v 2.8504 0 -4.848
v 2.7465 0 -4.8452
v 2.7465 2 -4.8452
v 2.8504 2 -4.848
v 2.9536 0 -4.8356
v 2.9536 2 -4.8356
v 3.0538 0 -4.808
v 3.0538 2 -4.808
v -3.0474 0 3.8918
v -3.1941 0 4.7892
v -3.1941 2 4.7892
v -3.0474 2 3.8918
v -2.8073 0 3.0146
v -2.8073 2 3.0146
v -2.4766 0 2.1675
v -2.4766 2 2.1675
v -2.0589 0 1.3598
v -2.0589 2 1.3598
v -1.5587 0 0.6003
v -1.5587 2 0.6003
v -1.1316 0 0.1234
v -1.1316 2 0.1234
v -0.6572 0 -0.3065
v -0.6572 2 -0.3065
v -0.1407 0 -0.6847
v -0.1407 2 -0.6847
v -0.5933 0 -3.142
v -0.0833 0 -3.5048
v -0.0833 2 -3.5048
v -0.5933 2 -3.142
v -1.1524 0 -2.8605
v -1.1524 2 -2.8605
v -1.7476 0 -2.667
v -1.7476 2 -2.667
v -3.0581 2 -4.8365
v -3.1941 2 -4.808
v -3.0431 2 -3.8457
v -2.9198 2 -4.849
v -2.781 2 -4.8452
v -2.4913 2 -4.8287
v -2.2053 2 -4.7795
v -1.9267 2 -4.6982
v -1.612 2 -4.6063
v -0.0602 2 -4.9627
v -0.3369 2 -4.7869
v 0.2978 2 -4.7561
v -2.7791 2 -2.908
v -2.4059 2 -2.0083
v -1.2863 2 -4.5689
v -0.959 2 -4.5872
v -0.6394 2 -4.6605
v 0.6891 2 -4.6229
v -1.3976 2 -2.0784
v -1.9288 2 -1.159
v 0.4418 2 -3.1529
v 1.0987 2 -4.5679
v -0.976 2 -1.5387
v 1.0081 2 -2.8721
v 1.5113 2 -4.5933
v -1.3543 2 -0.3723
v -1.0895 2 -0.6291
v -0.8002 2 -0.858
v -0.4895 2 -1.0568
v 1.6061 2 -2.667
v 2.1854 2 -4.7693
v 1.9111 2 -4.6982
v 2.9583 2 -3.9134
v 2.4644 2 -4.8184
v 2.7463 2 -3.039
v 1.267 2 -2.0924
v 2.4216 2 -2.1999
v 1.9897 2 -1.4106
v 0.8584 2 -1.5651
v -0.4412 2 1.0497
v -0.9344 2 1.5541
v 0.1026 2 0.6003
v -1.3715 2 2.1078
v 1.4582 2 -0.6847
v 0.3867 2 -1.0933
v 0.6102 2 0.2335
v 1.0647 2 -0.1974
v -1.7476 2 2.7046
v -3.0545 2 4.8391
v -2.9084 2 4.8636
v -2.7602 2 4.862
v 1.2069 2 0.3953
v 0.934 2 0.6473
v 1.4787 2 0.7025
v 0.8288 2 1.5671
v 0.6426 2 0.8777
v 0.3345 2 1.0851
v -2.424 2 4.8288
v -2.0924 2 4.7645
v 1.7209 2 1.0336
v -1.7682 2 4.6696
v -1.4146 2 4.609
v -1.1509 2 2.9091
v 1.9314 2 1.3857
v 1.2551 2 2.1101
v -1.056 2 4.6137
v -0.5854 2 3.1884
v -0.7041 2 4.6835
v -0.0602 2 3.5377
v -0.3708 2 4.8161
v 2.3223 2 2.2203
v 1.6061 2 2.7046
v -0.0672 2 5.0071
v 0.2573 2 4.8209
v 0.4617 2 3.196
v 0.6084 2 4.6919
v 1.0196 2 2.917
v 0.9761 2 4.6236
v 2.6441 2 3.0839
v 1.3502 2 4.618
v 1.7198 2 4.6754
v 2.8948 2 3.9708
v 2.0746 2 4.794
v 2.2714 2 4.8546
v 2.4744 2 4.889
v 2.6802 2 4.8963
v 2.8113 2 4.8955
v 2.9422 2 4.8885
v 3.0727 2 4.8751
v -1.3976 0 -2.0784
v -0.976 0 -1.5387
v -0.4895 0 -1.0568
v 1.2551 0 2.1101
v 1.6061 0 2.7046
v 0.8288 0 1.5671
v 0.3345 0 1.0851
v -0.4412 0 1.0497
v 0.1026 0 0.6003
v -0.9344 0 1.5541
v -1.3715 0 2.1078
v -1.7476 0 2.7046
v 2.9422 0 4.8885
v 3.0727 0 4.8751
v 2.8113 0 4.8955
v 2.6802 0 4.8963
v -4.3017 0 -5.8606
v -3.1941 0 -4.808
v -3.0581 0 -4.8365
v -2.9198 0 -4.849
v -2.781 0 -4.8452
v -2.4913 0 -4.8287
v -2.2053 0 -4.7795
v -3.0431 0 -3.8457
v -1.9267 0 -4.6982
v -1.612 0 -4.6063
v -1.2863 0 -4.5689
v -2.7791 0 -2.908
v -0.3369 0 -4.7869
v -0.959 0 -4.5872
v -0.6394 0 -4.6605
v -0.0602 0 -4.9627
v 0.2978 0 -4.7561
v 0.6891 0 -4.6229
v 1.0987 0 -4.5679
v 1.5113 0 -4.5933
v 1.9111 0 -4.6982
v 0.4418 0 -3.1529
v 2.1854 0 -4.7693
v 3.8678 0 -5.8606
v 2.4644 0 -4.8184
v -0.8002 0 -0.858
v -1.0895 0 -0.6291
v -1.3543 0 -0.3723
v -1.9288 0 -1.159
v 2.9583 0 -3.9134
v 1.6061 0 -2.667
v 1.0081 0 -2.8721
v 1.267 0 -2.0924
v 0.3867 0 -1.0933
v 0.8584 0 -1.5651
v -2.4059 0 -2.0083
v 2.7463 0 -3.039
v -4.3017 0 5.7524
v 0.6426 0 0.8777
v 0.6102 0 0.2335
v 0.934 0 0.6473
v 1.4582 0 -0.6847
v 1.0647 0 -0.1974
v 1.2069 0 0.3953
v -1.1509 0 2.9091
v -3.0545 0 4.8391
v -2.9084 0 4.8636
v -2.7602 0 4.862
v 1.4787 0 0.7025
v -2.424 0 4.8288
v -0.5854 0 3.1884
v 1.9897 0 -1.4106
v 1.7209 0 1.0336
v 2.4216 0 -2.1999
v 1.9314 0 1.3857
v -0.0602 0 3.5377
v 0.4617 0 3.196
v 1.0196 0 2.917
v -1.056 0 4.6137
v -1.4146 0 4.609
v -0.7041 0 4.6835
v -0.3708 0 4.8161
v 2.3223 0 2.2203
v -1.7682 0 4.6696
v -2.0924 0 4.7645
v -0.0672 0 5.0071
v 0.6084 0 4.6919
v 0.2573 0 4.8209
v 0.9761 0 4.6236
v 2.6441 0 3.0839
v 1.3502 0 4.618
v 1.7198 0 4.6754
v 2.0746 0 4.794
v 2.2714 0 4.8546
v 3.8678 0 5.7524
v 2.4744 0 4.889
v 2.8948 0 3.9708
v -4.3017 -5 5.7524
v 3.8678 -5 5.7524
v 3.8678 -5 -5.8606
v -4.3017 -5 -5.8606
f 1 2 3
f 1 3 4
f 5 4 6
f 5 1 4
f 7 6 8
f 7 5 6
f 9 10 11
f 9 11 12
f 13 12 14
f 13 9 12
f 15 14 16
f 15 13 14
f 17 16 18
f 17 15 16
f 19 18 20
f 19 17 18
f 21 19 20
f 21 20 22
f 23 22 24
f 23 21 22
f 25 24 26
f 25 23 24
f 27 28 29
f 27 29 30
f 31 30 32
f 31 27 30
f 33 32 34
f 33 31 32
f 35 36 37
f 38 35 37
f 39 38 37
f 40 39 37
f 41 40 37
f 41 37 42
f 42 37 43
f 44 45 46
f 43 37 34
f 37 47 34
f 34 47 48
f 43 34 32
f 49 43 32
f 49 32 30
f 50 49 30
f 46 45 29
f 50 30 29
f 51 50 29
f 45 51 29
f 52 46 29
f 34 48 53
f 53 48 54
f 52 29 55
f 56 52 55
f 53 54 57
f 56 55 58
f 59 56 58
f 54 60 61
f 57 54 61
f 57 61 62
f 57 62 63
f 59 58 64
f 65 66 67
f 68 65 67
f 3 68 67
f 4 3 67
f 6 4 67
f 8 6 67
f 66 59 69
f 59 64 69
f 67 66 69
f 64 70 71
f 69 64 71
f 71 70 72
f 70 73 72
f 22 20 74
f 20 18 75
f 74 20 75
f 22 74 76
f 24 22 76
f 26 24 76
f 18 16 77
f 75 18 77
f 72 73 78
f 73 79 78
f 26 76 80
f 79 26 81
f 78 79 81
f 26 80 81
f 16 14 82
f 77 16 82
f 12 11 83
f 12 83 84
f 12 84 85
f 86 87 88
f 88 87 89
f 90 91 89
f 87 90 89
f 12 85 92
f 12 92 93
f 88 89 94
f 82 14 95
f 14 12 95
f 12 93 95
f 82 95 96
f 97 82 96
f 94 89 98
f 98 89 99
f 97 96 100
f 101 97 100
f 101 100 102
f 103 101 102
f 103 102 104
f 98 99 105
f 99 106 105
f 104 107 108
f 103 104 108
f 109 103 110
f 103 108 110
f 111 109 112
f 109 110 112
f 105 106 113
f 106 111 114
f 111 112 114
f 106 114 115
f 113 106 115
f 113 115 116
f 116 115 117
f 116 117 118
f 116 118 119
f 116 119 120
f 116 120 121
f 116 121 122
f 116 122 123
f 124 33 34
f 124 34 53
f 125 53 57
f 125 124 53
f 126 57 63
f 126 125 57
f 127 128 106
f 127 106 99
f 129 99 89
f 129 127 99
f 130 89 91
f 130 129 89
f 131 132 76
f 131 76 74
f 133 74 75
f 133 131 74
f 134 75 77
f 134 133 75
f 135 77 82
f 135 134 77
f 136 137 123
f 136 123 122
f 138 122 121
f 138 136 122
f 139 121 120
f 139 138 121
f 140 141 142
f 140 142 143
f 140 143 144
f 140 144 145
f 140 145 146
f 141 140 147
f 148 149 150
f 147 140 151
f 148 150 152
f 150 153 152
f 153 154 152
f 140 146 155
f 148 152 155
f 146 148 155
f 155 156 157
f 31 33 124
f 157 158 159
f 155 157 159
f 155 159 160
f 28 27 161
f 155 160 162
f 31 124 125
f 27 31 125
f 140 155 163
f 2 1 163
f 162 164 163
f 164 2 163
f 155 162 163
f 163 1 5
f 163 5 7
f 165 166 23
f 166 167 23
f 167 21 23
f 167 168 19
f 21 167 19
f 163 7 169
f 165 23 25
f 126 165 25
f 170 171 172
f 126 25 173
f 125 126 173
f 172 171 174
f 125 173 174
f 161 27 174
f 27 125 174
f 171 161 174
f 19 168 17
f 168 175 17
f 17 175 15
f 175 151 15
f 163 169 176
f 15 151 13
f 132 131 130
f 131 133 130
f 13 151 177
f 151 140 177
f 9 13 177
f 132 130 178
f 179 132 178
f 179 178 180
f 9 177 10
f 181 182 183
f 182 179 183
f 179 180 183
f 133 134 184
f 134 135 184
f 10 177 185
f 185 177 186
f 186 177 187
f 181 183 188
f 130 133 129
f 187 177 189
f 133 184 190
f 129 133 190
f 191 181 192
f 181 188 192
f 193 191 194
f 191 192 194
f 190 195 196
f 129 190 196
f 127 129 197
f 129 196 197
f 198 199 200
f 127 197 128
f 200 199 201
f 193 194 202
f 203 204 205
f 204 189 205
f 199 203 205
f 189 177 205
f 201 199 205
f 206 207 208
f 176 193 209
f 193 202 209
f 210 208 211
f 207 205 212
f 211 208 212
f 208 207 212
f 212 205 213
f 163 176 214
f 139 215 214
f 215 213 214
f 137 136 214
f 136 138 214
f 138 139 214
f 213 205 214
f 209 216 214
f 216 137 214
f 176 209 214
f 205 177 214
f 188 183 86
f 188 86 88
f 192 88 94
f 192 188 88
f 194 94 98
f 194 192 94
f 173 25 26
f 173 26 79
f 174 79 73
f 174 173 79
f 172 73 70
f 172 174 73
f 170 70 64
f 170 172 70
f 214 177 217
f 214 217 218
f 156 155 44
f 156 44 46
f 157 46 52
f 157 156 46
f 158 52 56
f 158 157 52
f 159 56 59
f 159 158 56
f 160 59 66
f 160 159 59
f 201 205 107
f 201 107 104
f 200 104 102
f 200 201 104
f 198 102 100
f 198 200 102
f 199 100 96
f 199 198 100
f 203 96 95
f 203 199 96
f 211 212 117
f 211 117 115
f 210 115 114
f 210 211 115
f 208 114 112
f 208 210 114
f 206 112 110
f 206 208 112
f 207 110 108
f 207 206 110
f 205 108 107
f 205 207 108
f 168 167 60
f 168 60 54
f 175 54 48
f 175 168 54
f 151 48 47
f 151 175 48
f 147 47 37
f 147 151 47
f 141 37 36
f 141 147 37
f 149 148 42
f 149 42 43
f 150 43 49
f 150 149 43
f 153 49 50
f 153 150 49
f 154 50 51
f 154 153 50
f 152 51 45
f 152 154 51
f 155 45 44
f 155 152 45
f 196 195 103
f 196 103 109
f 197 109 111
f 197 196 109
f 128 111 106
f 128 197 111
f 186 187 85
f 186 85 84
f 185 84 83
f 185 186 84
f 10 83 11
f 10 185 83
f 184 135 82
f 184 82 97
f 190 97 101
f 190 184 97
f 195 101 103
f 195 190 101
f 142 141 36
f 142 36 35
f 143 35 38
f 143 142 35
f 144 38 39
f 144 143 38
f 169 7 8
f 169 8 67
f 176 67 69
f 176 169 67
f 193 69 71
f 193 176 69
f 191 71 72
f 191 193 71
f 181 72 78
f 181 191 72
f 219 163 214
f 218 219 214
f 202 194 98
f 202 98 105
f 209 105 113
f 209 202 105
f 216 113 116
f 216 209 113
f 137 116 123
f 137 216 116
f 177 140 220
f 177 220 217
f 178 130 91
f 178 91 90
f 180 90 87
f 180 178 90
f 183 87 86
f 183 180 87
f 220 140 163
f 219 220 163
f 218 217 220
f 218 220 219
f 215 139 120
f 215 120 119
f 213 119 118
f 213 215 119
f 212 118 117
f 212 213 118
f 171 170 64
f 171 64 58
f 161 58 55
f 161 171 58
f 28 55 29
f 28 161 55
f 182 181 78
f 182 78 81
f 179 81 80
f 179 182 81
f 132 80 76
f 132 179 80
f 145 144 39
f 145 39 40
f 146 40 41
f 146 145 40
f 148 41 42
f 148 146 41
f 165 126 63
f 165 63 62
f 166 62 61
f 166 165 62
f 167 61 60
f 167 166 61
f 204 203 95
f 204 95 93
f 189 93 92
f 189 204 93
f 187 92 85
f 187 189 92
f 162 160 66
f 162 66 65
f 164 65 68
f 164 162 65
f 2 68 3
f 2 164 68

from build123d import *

# Parameters (mm, degrees)
F1_DEPTH = 2
F0_W     = 8.1694817636
F0_H     = 11.6130132228
F2_DEPTH = 5


with BuildPart() as f1:
    # F0 (on Front) → F1 (new body)
    with BuildSketch(Plane.XZ):
        with BuildLine():
            ThreePointArc((2.0745592192, 4.7939633951), (0.9761382847, 4.6235844423), (-0.0671644666, 5.0070905127))
            ThreePointArc((-0.0671644666, 5.0070905127), (-0.8784360137, 4.6405956483), (-1.7681780737, 4.6695624478))
            ThreePointArc((-1.7681780737, 4.6695624478), (-2.2574396576, 4.800493813), (-2.7601739857, 4.8619601876))
            ThreePointArc((-2.7601739857, 4.8619601876), (-2.9819736355, 4.8545860582), (-3.1940550543, 4.7892336734))
            ThreePointArc((-3.1940550543, 4.7892336734), (-2.6531015818, 2.5867346288), (-1.5586973168, 0.6003026501))
            ThreePointArc((-1.5586973168, 0.6003026501), (-0.899975173, -0.0976882802), (-0.1406859956, -0.6847028853))
            ThreePointArc((-0.1406859956, -0.6847028853), (0.8584014623, -1.565082943), (1.606091857, -2.6669921353))
            ThreePointArc((1.606091857, -2.6669921353), (0.7204240657, -3.0032988166), (-0.0832898513, -3.5048499703))
            ThreePointArc((-0.0832898513, -3.5048499703), (-0.8674701353, -2.9905919725), (-1.7476310022, -2.6669921353))
            ThreePointArc((-1.7476310022, -2.6669921353), (-1.1953566595, -1.8018699169), (-0.4894761951, -1.0567684658))
            ThreePointArc((-0.4894761951, -1.0567684658), (-0.947757472, -0.7472134604), (-1.3543482637, -0.3723402042))
            ThreePointArc((-1.3543482637, -0.3723402042), (-2.6058728778, -2.4526172564), (-3.1940550543, -4.8080170527))
            ThreePointArc((-3.1940550543, -4.8080170527), (-2.9891724287, -4.8447819272), (-2.7810176834, -4.8451670446))
            ThreePointArc((-2.7810176834, -4.8451670446), (-2.3475821057, -4.8081959008), (-1.9267009338, -4.698230885))
            ThreePointArc((-1.9267009338, -4.698230885), (-0.9589614264, -4.5871526974), (-0.0601788415, -4.9627162516))
            ThreePointArc((-0.0601788415, -4.9627162516), (0.8925619892, -4.5853815797), (1.9110714784, -4.698230885))
            ThreePointArc((1.9110714784, -4.698230885), (2.3244075631, -4.7966180699), (2.7465091553, -4.8451670446))
            ThreePointArc((2.7465091553, -4.8451670446), (2.9022453839, -4.8437183941), (3.0538411811, -4.8080170527))
            ThreePointArc((3.0538411811, -4.8080170527), (2.5977340123, -2.6141166836), (1.4581748983, -0.6847028853))
            ThreePointArc((1.4581748983, -0.6847028853), (0.844614848, 0.0255748016), (0.1025648307, 0.6003026501))
            ThreePointArc((0.1025648307, 0.6003026501), (-0.9344126252, 1.5540806838), (-1.7476310022, 2.7045982424))
            ThreePointArc((-1.7476310022, 2.7045982424), (-0.863666357, 3.0396657594), (-0.0601788415, 3.5377335735))
            ThreePointArc((-0.0601788415, 3.5377335735), (0.7365671742, 3.0483872393), (1.606091857, 2.7045982424))
            ThreePointArc((1.606091857, 2.7045982424), (1.0509505262, 1.8315226419), (0.3344639845, 1.0851380648))
            ThreePointArc((0.3344639845, 1.0851380648), (0.7904820411, 0.7652480559), (1.2069143122, 0.3952936677))
            ThreePointArc((1.2069143122, 0.3952936677), (1.6036378384, 0.865266534), (1.9314256497, 1.3856694568))
            ThreePointArc((1.9314256497, 1.3856694568), (2.6441028172, 3.083940128), (3.0726515688, 4.8751346973))
            ThreePointArc((3.0726515688, 4.8751346973), (2.8768268251, 4.8927984193), (2.680238802, 4.8963320442))
            ThreePointArc((2.680238802, 4.8963320442), (2.3723307757, 4.8751346973), (2.0745592192, 4.7939633951))
        make_face()
    extrude(amount=-F1_DEPTH)

    # F0 (on Front) + F1_face (on face) → F2 (join)
    with BuildSketch(Plane.XZ):
        with Locations((-0.2169868676, -0.0541191548)):
            Rectangle(F0_W, F0_H)
        with BuildLine():
            ThreePointArc((-1.7681780737, 4.6695624478), (-0.8784360137, 4.6405956483), (-0.0671644666, 5.0070905127))
            ThreePointArc((-0.0671644666, 5.0070905127), (0.9761382847, 4.6235844423), (2.0745592192, 4.7939633951))
            ThreePointArc((2.0745592192, 4.7939633951), (2.3723307757, 4.8751346973), (2.680238802, 4.8963320442))
            ThreePointArc((2.680238802, 4.8963320442), (2.8768268251, 4.8927984193), (3.0726515688, 4.8751346973))
            ThreePointArc((3.0726515688, 4.8751346973), (2.6441028172, 3.083940128), (1.9314256497, 1.3856694568))
            ThreePointArc((1.9314256497, 1.3856694568), (1.6036378384, 0.865266534), (1.2069143122, 0.3952936677))
            ThreePointArc((1.2069143122, 0.3952936677), (0.7904820411, 0.7652480559), (0.3344639845, 1.0851380648))
            ThreePointArc((0.3344639845, 1.0851380648), (1.0509505262, 1.8315226419), (1.606091857, 2.7045982424))
            ThreePointArc((1.606091857, 2.7045982424), (0.7365671742, 3.0483872393), (-0.0601788415, 3.5377335735))
            ThreePointArc((-0.0601788415, 3.5377335735), (-0.863666357, 3.0396657594), (-1.7476310022, 2.7045982424))
            ThreePointArc((-1.7476310022, 2.7045982424), (-0.9344126252, 1.5540806838), (0.1025648307, 0.6003026501))
            ThreePointArc((0.1025648307, 0.6003026501), (0.844614848, 0.0255748016), (1.4581748983, -0.6847028853))
            ThreePointArc((1.4581748983, -0.6847028853), (2.5977340123, -2.6141166836), (3.0538411811, -4.8080170527))
            ThreePointArc((3.0538411811, -4.8080170527), (2.9022453839, -4.8437183941), (2.7465091553, -4.8451670446))
            ThreePointArc((2.7465091553, -4.8451670446), (2.3244075631, -4.7966180699), (1.9110714784, -4.698230885))
            ThreePointArc((1.9110714784, -4.698230885), (0.8925619892, -4.5853815797), (-0.0601788415, -4.9627162516))
            ThreePointArc((-0.0601788415, -4.9627162516), (-0.9589614264, -4.5871526974), (-1.9267009338, -4.698230885))
            ThreePointArc((-1.9267009338, -4.698230885), (-2.3475821057, -4.8081959008), (-2.7810176834, -4.8451670446))
            ThreePointArc((-2.7810176834, -4.8451670446), (-2.9891724287, -4.8447819272), (-3.1940550543, -4.8080170527))
            ThreePointArc((-3.1940550543, -4.8080170527), (-2.6058728778, -2.4526172564), (-1.3543482637, -0.3723402042))
            ThreePointArc((-1.3543482637, -0.3723402042), (-0.947757472, -0.7472134604), (-0.4894761951, -1.0567684658))
            ThreePointArc((-0.4894761951, -1.0567684658), (-1.1953566595, -1.8018699169), (-1.7476310022, -2.6669921353))
            ThreePointArc((-1.7476310022, -2.6669921353), (-0.8674701353, -2.9905919725), (-0.0832898513, -3.5048499703))
            ThreePointArc((-0.0832898513, -3.5048499703), (0.7204240657, -3.0032988166), (1.606091857, -2.6669921353))
            ThreePointArc((1.606091857, -2.6669921353), (0.8584014623, -1.565082943), (-0.1406859956, -0.6847028853))
            ThreePointArc((-0.1406859956, -0.6847028853), (-0.899975173, -0.0976882802), (-1.5586973168, 0.6003026501))
            ThreePointArc((-1.5586973168, 0.6003026501), (-2.6531015818, 2.5867346288), (-3.1940550543, 4.7892336734))
            ThreePointArc((-3.1940550543, 4.7892336734), (-2.9819736355, 4.8545860582), (-2.7601739857, 4.8619601876))
            ThreePointArc((-2.7601739857, 4.8619601876), (-2.2574396576, 4.800493813), (-1.7681780737, 4.6695624478))
        make_face(mode=Mode.SUBTRACT)
        with BuildLine():
            ThreePointArc((2.0745592192, 4.7939633951), (0.9761382847, 4.6235844423), (-0.0671644666, 5.0070905127))
            ThreePointArc((-0.0671644666, 5.0070905127), (-0.8784360137, 4.6405956483), (-1.7681780737, 4.6695624478))
            ThreePointArc((-1.7681780737, 4.6695624478), (-2.2574396576, 4.800493813), (-2.7601739857, 4.8619601876))
            ThreePointArc((-2.7601739857, 4.8619601876), (-2.9819736355, 4.8545860582), (-3.1940550543, 4.7892336734))
            ThreePointArc((-3.1940550543, 4.7892336734), (-2.6531015818, 2.5867346288), (-1.5586973168, 0.6003026501))
            ThreePointArc((-1.5586973168, 0.6003026501), (-0.899975173, -0.0976882802), (-0.1406859956, -0.6847028853))
            ThreePointArc((-0.1406859956, -0.6847028853), (0.8584014623, -1.565082943), (1.606091857, -2.6669921353))
            ThreePointArc((1.606091857, -2.6669921353), (0.7204240657, -3.0032988166), (-0.0832898513, -3.5048499703))
            ThreePointArc((-0.0832898513, -3.5048499703), (-0.8674701353, -2.9905919725), (-1.7476310022, -2.6669921353))
            ThreePointArc((-1.7476310022, -2.6669921353), (-1.1953566595, -1.8018699169), (-0.4894761951, -1.0567684658))
            ThreePointArc((-0.4894761951, -1.0567684658), (-0.947757472, -0.7472134604), (-1.3543482637, -0.3723402042))
            ThreePointArc((-1.3543482637, -0.3723402042), (-2.6058728778, -2.4526172564), (-3.1940550543, -4.8080170527))
            ThreePointArc((-3.1940550543, -4.8080170527), (-2.9891724287, -4.8447819272), (-2.7810176834, -4.8451670446))
            ThreePointArc((-2.7810176834, -4.8451670446), (-2.3475821057, -4.8081959008), (-1.9267009338, -4.698230885))
            ThreePointArc((-1.9267009338, -4.698230885), (-0.9589614264, -4.5871526974), (-0.0601788415, -4.9627162516))
            ThreePointArc((-0.0601788415, -4.9627162516), (0.8925619892, -4.5853815797), (1.9110714784, -4.698230885))
            ThreePointArc((1.9110714784, -4.698230885), (2.3244075631, -4.7966180699), (2.7465091553, -4.8451670446))
            ThreePointArc((2.7465091553, -4.8451670446), (2.9022453839, -4.8437183941), (3.0538411811, -4.8080170527))
            ThreePointArc((3.0538411811, -4.8080170527), (2.5977340123, -2.6141166836), (1.4581748983, -0.6847028853))
            ThreePointArc((1.4581748983, -0.6847028853), (0.844614848, 0.0255748016), (0.1025648307, 0.6003026501))
            ThreePointArc((0.1025648307, 0.6003026501), (-0.9344126252, 1.5540806838), (-1.7476310022, 2.7045982424))
            ThreePointArc((-1.7476310022, 2.7045982424), (-0.863666357, 3.0396657594), (-0.0601788415, 3.5377335735))
            ThreePointArc((-0.0601788415, 3.5377335735), (0.7365671742, 3.0483872393), (1.606091857, 2.7045982424))
            ThreePointArc((1.606091857, 2.7045982424), (1.0509505262, 1.8315226419), (0.3344639845, 1.0851380648))
            ThreePointArc((0.3344639845, 1.0851380648), (0.7904820411, 0.7652480559), (1.2069143122, 0.3952936677))
            ThreePointArc((1.2069143122, 0.3952936677), (1.6036378384, 0.865266534), (1.9314256497, 1.3856694568))
            ThreePointArc((1.9314256497, 1.3856694568), (2.6441028172, 3.083940128), (3.0726515688, 4.8751346973))
            ThreePointArc((3.0726515688, 4.8751346973), (2.8768268251, 4.8927984193), (2.680238802, 4.8963320442))
            ThreePointArc((2.680238802, 4.8963320442), (2.3723307757, 4.8751346973), (2.0745592192, 4.7939633951))
        make_face()
    with BuildSketch(Plane(origin=(-0.0652834318, 2, -5.64561e-05), x_dir=(1, 0, 0), z_dir=(0, 1, 0))):
        with BuildLine():
            ThreePointArc((2.7455222338, -4.8963885003), (2.9421102569, -4.8928548754), (3.1379350006, -4.8751911534))
            ThreePointArc((3.1379350006, -4.8751911534), (2.7093862491, -3.0839965841), (1.9967090815, -1.3857259129))
            ThreePointArc((1.9967090815, -1.3857259129), (1.6689212703, -0.8653229901), (1.2721977441, -0.3953501238))
            ThreePointArc((1.2721977441, -0.3953501238), (0.8557654729, -0.765304512), (0.3997474163, -1.0851945209))
            ThreePointArc((0.3997474163, -1.0851945209), (1.1162339581, -1.831579098), (1.6713752888, -2.7046546985))
            ThreePointArc((1.6713752888, -2.7046546985), (0.801850606, -3.0484436954), (0.0051045903, -3.5377900296))
            ThreePointArc((0.0051045903, -3.5377900296), (-0.7983829252, -3.0397222155), (-1.6823475704, -2.7046546985))
            ThreePointArc((-1.6823475704, -2.7046546985), (-0.8691291933, -1.5541371399), (0.1678482626, -0.6003591062))
            ThreePointArc((0.1678482626, -0.6003591062), (0.9098982798, -0.0256312577), (1.5234583301, 0.6846464292))
            ThreePointArc((1.5234583301, 0.6846464292), (2.6630174442, 2.6140602274), (3.1191246129, 4.8079605966))
            ThreePointArc((3.1191246129, 4.8079605966), (2.9675288158, 4.843661938), (2.8117925871, 4.8451105884))
            ThreePointArc((2.8117925871, 4.8451105884), (2.3896909949, 4.7965616138), (1.9763549102, 4.6981744289))
            ThreePointArc((1.9763549102, 4.6981744289), (0.9578454211, 4.5853251236), (0.0051045903, 4.9626597955))
            ThreePointArc((0.0051045903, 4.9626597955), (-0.8936779945, 4.5870962413), (-1.861417502, 4.6981744289))
            ThreePointArc((-1.861417502, 4.6981744289), (-2.2822986738, 4.8081394447), (-2.7157342516, 4.8451105884))
            ThreePointArc((-2.7157342516, 4.8451105884), (-2.9238889969, 4.8447254711), (-3.1287716225, 4.8079605966))
            ThreePointArc((-3.1287716225, 4.8079605966), (-2.540589446, 2.4525608002), (-1.2890648319, 0.3722837481))
            ThreePointArc((-1.2890648319, 0.3722837481), (-0.8824740402, 0.7471570043), (-0.4241927632, 1.0567120097))
            ThreePointArc((-0.4241927632, 1.0567120097), (-1.1300732277, 1.8018134607), (-1.6823475704, 2.6669356792))
            ThreePointArc((-1.6823475704, 2.6669356792), (-0.8021867035, 2.9905355164), (-0.0180064195, 3.5047935142))
            ThreePointArc((-0.0180064195, 3.5047935142), (0.7857074976, 3.0032423605), (1.6713752888, 2.6669356792))
            ThreePointArc((1.6713752888, 2.6669356792), (0.9236848942, 1.5650264869), (-0.0754025637, 0.6846464292))
            ThreePointArc((-0.0754025637, 0.6846464292), (-0.8346917412, 0.0976318241), (-1.493413885, -0.6003591062))
            ThreePointArc((-1.493413885, -0.6003591062), (-2.5878181499, -2.5867910849), (-3.1287716225, -4.7892901295))
            ThreePointArc((-3.1287716225, -4.7892901295), (-2.9166902037, -4.8546425143), (-2.6948905539, -4.8620166437))
            ThreePointArc((-2.6948905539, -4.8620166437), (-2.1921562258, -4.8005502691), (-1.7028946418, -4.6696189039))
            ThreePointArc((-1.7028946418, -4.6696189039), (-0.8131525819, -4.6406521044), (-0.0018810348, -5.0071469688))
            ThreePointArc((-0.0018810348, -5.0071469688), (1.0414217165, -4.6236408985), (2.139842651, -4.7940198512))
            ThreePointArc((2.139842651, -4.7940198512), (2.4376142075, -4.8751911534), (2.7455222338, -4.8963885003))
        make_face()
    extrude(amount=F2_DEPTH, dir=(0, -1, 0))


solid = f1.part
